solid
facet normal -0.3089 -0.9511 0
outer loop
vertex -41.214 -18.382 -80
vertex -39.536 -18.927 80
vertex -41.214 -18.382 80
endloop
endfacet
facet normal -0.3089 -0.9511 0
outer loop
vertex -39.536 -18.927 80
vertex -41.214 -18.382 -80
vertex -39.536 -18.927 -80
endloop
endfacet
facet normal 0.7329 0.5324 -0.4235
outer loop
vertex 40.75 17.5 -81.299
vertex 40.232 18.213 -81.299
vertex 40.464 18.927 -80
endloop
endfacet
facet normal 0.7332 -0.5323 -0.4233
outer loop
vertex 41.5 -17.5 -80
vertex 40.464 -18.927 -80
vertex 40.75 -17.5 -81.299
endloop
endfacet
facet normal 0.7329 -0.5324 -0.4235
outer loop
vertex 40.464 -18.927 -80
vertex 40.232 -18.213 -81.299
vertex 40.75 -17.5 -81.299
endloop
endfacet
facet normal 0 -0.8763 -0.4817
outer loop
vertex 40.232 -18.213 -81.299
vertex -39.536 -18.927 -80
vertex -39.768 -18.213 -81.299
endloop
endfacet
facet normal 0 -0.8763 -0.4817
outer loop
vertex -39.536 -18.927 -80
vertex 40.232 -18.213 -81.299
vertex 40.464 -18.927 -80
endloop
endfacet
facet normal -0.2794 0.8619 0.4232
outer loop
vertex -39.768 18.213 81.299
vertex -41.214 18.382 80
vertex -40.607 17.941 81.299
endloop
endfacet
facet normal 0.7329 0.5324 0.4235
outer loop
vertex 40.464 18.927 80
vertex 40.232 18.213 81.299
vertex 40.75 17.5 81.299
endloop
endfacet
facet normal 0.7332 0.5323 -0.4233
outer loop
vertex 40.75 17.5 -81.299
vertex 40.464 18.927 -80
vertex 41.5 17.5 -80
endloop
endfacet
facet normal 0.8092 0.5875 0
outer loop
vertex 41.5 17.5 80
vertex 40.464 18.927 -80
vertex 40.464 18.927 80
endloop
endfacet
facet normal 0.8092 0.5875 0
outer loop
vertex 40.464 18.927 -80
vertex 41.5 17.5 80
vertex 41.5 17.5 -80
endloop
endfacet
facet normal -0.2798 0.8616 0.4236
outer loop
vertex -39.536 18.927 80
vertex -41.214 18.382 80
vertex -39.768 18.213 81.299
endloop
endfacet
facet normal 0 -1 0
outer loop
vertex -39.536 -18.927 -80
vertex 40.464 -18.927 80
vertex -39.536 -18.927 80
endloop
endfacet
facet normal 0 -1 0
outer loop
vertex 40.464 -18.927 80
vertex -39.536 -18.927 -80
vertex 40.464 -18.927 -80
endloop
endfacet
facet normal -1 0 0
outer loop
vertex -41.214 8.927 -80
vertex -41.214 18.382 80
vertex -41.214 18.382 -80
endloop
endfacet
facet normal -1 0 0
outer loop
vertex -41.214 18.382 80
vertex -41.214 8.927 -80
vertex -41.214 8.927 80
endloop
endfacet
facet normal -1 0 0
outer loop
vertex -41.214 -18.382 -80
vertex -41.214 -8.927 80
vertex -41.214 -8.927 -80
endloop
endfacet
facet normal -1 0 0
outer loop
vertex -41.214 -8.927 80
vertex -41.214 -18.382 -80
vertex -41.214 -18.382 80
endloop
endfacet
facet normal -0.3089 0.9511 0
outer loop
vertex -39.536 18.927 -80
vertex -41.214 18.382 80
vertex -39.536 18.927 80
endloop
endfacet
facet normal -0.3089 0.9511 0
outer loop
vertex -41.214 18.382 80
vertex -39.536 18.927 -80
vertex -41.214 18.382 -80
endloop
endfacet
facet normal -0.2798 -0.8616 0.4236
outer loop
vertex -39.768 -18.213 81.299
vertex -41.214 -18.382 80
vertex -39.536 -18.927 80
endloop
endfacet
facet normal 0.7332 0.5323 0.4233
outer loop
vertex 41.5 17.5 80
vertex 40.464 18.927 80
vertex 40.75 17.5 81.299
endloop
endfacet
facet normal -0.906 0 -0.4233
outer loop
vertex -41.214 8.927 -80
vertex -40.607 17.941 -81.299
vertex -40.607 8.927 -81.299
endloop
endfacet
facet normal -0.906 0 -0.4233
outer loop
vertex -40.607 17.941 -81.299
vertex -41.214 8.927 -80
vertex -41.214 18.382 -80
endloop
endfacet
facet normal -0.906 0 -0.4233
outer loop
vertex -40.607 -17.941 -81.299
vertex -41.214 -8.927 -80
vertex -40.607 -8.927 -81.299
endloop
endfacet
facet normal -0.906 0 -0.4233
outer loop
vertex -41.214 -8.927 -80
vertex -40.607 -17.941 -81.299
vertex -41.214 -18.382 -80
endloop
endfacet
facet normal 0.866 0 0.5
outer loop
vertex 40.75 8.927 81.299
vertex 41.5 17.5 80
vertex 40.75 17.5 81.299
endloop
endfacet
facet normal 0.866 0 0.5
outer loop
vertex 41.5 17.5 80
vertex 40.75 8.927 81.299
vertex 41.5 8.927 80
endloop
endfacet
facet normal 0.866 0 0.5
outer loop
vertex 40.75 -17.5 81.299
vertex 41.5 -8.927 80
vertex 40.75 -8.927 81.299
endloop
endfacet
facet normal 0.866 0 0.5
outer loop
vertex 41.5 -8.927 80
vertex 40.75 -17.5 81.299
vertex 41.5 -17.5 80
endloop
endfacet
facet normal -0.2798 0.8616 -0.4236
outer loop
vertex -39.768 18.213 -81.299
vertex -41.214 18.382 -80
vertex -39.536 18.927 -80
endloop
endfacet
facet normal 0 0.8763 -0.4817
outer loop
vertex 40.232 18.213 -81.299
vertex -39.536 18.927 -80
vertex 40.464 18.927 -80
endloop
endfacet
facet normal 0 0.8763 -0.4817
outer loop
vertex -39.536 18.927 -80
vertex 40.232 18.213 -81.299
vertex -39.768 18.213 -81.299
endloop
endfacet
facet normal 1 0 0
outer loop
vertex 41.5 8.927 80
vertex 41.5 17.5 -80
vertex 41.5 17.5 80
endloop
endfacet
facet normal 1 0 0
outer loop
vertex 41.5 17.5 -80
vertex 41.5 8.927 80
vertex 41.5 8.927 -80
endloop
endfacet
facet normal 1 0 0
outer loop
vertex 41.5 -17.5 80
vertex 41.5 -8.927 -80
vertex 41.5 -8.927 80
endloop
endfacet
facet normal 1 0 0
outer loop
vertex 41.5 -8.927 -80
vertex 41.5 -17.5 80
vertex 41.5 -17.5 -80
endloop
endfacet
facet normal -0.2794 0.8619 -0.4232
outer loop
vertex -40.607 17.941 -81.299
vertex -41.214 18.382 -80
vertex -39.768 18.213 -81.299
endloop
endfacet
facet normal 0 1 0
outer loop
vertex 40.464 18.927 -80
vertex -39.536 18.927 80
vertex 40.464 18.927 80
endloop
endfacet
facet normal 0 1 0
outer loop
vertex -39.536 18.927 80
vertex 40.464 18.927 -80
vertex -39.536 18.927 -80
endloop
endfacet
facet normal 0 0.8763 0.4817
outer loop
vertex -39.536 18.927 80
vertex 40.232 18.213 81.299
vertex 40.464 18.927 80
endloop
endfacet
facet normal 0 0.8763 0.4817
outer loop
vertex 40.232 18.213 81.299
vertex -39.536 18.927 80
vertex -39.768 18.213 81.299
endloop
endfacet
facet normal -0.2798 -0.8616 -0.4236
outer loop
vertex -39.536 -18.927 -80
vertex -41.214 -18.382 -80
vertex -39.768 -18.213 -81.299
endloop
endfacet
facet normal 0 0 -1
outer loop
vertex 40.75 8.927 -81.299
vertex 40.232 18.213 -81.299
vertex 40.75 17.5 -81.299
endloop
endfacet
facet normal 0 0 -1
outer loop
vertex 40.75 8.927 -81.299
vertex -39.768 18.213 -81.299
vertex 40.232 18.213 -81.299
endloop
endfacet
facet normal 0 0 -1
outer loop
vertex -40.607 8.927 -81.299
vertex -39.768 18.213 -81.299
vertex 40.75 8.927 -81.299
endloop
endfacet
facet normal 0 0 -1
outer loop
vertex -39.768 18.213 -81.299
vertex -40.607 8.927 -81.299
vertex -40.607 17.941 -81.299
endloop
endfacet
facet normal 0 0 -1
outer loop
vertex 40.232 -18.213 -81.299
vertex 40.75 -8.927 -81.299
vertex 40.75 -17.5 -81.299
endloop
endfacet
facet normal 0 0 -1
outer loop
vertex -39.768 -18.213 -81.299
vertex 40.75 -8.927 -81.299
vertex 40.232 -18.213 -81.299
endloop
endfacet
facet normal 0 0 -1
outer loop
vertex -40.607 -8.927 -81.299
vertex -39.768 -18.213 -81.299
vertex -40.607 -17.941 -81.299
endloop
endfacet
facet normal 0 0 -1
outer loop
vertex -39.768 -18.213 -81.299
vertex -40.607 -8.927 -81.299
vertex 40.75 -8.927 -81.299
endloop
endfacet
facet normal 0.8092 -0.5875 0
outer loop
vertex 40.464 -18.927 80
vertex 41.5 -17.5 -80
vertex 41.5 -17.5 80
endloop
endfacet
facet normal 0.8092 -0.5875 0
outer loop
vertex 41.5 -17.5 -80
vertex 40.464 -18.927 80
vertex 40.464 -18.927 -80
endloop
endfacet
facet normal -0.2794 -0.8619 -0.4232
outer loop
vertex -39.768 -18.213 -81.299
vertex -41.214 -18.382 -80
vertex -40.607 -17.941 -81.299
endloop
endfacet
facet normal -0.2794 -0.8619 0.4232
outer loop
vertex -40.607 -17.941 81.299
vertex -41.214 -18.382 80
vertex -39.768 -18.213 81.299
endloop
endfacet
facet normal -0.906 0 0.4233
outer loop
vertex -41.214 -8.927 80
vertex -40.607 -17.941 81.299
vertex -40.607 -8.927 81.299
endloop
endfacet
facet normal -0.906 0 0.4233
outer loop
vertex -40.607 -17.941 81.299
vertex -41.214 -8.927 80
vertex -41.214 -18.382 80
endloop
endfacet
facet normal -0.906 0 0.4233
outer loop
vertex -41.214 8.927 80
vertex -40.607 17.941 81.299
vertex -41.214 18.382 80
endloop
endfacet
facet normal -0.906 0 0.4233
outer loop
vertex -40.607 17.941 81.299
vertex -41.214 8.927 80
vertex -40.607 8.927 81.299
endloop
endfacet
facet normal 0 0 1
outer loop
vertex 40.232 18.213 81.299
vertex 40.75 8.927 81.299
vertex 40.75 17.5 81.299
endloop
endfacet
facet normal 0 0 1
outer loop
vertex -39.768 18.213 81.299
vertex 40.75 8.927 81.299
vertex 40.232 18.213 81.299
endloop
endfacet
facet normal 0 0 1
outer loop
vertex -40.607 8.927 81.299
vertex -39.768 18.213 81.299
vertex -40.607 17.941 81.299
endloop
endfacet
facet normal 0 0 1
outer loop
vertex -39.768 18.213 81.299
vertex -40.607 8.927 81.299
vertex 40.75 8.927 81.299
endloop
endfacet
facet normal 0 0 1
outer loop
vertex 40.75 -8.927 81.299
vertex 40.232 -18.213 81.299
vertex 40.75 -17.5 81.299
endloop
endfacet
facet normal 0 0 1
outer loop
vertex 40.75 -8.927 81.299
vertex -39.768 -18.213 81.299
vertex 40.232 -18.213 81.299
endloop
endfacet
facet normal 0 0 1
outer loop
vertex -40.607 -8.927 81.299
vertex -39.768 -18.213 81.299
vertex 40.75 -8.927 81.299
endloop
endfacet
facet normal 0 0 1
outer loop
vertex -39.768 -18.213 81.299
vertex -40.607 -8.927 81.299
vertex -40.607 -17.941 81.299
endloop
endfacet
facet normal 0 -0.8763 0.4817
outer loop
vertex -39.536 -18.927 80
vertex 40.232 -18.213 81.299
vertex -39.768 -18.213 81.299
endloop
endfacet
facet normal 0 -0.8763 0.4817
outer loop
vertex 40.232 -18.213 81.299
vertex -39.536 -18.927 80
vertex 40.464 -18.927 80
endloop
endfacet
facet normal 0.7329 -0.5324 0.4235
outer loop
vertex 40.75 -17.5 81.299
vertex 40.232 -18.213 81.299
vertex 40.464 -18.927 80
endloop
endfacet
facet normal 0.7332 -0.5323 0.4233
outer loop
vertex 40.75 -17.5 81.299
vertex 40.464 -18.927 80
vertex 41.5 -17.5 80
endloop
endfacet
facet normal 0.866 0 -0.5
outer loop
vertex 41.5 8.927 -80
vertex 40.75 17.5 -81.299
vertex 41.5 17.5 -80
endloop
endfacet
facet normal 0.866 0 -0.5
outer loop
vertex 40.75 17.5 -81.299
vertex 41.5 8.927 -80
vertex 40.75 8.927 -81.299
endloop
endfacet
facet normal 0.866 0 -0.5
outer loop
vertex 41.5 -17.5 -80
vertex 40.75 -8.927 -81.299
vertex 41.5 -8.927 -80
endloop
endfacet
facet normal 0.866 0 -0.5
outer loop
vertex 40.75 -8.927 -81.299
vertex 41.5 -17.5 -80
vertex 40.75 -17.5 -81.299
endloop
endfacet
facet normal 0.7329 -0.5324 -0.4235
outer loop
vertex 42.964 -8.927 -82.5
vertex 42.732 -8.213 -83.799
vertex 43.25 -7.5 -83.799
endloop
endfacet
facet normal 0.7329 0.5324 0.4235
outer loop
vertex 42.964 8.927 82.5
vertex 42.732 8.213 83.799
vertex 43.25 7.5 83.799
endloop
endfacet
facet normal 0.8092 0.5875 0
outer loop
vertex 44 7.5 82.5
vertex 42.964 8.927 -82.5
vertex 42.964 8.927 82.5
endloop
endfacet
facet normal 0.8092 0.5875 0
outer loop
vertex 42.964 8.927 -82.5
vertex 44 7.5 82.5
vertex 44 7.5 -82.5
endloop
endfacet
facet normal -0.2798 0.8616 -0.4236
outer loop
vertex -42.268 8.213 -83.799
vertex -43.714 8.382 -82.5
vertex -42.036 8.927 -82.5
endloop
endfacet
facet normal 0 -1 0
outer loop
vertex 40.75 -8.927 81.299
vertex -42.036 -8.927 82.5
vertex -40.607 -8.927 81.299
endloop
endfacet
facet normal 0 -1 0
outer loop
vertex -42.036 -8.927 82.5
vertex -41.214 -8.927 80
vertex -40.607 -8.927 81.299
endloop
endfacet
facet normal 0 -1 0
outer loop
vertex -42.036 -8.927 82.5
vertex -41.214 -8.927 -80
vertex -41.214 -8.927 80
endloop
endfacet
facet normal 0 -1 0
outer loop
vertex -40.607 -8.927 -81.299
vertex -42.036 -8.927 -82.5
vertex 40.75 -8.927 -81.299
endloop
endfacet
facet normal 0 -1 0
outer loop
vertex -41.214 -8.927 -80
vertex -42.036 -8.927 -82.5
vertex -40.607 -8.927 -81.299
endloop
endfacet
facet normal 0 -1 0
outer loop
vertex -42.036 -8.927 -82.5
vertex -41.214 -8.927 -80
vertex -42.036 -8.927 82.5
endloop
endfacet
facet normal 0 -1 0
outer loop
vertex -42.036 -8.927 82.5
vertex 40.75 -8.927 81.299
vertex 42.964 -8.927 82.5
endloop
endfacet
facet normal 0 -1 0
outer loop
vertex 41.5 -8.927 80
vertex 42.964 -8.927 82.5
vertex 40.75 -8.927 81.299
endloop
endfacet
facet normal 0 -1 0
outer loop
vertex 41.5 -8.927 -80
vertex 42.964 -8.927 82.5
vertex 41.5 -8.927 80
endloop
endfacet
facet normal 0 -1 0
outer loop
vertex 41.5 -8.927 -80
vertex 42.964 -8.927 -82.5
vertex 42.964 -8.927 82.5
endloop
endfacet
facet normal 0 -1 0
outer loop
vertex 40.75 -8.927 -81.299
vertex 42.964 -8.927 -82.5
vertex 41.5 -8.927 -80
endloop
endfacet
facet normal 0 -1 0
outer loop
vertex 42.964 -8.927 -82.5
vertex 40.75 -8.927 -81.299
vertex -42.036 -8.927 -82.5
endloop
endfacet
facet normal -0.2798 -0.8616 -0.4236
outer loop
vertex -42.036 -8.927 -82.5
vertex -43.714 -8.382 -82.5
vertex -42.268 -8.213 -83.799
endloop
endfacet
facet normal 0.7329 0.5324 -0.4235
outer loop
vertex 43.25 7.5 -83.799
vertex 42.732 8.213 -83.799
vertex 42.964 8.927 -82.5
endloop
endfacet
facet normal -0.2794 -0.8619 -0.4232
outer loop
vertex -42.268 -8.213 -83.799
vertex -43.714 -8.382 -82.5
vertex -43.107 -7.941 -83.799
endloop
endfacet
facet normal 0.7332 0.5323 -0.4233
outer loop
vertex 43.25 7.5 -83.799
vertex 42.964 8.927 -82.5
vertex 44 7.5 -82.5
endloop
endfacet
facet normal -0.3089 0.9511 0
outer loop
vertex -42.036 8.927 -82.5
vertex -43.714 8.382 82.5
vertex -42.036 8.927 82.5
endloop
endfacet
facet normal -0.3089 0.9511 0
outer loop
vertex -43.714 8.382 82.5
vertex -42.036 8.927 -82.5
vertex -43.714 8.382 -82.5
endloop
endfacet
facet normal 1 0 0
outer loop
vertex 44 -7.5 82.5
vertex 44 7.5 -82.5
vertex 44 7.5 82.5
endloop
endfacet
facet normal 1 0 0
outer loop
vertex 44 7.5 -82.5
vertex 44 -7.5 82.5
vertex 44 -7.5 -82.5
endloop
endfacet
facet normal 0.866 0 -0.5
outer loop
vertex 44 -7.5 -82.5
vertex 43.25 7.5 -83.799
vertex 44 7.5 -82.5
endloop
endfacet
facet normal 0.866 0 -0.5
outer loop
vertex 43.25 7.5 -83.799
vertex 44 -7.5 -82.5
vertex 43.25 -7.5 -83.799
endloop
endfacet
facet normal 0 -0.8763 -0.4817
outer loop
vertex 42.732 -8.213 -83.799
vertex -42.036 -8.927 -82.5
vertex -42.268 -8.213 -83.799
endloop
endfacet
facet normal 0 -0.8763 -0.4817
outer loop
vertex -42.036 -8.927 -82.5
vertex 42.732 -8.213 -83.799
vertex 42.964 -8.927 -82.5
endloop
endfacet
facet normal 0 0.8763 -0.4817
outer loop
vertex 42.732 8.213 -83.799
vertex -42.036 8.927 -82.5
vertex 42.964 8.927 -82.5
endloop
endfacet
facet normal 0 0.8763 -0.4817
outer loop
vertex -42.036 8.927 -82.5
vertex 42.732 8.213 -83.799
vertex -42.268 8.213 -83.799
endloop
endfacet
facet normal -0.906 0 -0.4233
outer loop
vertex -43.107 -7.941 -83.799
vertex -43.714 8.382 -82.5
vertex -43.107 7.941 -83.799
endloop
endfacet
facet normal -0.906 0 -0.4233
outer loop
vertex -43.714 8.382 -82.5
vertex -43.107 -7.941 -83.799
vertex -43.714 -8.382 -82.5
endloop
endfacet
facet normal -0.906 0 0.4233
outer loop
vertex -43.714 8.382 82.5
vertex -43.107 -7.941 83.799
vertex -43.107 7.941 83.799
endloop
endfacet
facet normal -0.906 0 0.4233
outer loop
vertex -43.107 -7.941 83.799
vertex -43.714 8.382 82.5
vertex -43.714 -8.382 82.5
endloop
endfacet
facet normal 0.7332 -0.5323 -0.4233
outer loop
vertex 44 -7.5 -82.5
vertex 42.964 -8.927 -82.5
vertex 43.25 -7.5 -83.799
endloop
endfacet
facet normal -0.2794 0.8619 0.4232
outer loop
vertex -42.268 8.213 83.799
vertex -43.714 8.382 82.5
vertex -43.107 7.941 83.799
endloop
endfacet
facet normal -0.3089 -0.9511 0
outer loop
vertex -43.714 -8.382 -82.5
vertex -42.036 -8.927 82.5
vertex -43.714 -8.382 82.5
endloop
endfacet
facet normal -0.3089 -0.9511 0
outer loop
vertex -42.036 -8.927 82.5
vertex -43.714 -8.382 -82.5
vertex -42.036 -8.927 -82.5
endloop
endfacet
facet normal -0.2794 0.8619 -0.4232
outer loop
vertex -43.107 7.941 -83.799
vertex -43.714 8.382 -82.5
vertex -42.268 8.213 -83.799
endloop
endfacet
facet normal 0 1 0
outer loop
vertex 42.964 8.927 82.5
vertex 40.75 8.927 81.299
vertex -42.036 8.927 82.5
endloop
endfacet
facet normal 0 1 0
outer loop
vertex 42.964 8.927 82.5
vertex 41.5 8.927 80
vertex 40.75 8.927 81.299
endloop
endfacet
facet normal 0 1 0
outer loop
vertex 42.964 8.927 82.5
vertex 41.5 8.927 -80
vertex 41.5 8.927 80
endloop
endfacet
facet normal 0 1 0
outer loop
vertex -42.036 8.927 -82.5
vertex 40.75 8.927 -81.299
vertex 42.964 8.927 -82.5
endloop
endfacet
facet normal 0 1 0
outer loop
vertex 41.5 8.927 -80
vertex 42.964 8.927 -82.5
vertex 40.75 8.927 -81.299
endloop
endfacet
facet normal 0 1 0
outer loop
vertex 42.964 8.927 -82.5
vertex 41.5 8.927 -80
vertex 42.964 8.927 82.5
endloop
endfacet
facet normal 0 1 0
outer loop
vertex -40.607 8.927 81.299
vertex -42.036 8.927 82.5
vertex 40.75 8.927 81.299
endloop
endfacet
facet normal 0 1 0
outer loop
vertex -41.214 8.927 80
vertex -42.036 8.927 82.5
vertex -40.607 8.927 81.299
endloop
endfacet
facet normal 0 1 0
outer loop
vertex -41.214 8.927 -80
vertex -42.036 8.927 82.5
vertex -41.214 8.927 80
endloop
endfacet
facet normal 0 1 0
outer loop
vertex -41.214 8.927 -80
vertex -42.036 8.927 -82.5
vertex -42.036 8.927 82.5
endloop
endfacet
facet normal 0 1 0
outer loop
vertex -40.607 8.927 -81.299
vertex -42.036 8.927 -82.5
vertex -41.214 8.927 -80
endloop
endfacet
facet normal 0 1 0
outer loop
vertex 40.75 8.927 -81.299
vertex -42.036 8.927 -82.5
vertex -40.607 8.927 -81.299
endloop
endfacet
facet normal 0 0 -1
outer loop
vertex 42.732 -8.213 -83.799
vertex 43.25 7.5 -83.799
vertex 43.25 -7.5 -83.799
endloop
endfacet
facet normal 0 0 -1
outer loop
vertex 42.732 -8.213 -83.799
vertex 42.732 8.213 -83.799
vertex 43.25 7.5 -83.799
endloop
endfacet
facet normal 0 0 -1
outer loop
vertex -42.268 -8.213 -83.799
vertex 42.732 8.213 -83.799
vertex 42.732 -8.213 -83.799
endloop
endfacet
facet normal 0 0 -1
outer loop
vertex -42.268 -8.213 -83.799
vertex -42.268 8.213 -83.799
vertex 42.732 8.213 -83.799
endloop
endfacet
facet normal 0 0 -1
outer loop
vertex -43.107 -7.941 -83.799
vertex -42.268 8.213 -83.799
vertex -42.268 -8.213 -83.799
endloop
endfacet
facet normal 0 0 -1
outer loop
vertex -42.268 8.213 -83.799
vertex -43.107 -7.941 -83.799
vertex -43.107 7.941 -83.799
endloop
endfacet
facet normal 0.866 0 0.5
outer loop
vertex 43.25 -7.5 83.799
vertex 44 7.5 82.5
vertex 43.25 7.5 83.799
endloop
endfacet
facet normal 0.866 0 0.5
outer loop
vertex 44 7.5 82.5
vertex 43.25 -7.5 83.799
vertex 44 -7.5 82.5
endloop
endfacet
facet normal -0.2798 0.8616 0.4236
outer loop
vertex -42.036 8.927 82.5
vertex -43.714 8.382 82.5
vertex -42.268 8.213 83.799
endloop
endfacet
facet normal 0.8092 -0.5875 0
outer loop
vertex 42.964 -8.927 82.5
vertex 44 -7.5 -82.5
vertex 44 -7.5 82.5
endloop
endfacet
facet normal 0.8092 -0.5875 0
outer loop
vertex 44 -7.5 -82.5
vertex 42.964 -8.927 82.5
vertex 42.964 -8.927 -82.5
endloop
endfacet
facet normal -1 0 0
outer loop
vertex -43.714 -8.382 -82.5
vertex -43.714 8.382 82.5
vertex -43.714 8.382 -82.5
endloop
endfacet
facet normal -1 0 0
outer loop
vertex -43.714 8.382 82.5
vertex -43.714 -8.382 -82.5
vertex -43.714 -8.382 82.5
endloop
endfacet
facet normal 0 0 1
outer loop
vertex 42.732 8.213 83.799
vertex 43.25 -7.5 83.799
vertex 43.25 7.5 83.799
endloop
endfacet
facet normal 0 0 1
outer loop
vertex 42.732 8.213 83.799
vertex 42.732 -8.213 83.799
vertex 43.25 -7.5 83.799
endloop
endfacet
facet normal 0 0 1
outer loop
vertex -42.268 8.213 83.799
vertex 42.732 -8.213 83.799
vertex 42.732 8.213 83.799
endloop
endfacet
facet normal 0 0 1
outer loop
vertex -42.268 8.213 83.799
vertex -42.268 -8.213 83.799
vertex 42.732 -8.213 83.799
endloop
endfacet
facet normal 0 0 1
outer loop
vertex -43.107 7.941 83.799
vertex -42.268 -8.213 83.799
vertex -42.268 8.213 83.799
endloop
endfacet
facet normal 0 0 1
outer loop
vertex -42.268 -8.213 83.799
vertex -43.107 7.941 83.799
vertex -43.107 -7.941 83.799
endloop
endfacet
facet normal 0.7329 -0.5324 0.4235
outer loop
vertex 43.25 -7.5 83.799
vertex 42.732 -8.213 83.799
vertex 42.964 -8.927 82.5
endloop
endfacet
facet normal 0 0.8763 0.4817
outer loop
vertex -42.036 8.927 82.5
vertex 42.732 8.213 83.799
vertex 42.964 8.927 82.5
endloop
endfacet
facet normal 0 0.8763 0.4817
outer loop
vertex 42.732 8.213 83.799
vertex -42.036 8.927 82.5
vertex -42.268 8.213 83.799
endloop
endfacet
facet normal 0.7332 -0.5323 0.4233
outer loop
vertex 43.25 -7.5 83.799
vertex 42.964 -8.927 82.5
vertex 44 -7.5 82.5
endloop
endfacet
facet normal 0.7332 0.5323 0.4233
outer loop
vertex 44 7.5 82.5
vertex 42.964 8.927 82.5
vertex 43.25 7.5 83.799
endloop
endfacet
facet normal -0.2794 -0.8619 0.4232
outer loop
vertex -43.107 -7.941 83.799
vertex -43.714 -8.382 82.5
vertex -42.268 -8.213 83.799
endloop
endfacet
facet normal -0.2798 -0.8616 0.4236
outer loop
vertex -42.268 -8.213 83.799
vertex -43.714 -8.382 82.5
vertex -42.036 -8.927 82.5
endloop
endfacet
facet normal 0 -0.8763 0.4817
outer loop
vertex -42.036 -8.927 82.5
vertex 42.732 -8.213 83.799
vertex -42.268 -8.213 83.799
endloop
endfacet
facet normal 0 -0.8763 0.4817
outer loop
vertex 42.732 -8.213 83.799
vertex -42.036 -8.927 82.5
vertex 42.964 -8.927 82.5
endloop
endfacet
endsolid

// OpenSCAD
minkowski(){
    cube([80, 35, 160], center=true);
    sphere(r=1.5);
}

minkowski(){
    cube([85, 15, 165], center=true);
    sphere(r=1.5);
}
